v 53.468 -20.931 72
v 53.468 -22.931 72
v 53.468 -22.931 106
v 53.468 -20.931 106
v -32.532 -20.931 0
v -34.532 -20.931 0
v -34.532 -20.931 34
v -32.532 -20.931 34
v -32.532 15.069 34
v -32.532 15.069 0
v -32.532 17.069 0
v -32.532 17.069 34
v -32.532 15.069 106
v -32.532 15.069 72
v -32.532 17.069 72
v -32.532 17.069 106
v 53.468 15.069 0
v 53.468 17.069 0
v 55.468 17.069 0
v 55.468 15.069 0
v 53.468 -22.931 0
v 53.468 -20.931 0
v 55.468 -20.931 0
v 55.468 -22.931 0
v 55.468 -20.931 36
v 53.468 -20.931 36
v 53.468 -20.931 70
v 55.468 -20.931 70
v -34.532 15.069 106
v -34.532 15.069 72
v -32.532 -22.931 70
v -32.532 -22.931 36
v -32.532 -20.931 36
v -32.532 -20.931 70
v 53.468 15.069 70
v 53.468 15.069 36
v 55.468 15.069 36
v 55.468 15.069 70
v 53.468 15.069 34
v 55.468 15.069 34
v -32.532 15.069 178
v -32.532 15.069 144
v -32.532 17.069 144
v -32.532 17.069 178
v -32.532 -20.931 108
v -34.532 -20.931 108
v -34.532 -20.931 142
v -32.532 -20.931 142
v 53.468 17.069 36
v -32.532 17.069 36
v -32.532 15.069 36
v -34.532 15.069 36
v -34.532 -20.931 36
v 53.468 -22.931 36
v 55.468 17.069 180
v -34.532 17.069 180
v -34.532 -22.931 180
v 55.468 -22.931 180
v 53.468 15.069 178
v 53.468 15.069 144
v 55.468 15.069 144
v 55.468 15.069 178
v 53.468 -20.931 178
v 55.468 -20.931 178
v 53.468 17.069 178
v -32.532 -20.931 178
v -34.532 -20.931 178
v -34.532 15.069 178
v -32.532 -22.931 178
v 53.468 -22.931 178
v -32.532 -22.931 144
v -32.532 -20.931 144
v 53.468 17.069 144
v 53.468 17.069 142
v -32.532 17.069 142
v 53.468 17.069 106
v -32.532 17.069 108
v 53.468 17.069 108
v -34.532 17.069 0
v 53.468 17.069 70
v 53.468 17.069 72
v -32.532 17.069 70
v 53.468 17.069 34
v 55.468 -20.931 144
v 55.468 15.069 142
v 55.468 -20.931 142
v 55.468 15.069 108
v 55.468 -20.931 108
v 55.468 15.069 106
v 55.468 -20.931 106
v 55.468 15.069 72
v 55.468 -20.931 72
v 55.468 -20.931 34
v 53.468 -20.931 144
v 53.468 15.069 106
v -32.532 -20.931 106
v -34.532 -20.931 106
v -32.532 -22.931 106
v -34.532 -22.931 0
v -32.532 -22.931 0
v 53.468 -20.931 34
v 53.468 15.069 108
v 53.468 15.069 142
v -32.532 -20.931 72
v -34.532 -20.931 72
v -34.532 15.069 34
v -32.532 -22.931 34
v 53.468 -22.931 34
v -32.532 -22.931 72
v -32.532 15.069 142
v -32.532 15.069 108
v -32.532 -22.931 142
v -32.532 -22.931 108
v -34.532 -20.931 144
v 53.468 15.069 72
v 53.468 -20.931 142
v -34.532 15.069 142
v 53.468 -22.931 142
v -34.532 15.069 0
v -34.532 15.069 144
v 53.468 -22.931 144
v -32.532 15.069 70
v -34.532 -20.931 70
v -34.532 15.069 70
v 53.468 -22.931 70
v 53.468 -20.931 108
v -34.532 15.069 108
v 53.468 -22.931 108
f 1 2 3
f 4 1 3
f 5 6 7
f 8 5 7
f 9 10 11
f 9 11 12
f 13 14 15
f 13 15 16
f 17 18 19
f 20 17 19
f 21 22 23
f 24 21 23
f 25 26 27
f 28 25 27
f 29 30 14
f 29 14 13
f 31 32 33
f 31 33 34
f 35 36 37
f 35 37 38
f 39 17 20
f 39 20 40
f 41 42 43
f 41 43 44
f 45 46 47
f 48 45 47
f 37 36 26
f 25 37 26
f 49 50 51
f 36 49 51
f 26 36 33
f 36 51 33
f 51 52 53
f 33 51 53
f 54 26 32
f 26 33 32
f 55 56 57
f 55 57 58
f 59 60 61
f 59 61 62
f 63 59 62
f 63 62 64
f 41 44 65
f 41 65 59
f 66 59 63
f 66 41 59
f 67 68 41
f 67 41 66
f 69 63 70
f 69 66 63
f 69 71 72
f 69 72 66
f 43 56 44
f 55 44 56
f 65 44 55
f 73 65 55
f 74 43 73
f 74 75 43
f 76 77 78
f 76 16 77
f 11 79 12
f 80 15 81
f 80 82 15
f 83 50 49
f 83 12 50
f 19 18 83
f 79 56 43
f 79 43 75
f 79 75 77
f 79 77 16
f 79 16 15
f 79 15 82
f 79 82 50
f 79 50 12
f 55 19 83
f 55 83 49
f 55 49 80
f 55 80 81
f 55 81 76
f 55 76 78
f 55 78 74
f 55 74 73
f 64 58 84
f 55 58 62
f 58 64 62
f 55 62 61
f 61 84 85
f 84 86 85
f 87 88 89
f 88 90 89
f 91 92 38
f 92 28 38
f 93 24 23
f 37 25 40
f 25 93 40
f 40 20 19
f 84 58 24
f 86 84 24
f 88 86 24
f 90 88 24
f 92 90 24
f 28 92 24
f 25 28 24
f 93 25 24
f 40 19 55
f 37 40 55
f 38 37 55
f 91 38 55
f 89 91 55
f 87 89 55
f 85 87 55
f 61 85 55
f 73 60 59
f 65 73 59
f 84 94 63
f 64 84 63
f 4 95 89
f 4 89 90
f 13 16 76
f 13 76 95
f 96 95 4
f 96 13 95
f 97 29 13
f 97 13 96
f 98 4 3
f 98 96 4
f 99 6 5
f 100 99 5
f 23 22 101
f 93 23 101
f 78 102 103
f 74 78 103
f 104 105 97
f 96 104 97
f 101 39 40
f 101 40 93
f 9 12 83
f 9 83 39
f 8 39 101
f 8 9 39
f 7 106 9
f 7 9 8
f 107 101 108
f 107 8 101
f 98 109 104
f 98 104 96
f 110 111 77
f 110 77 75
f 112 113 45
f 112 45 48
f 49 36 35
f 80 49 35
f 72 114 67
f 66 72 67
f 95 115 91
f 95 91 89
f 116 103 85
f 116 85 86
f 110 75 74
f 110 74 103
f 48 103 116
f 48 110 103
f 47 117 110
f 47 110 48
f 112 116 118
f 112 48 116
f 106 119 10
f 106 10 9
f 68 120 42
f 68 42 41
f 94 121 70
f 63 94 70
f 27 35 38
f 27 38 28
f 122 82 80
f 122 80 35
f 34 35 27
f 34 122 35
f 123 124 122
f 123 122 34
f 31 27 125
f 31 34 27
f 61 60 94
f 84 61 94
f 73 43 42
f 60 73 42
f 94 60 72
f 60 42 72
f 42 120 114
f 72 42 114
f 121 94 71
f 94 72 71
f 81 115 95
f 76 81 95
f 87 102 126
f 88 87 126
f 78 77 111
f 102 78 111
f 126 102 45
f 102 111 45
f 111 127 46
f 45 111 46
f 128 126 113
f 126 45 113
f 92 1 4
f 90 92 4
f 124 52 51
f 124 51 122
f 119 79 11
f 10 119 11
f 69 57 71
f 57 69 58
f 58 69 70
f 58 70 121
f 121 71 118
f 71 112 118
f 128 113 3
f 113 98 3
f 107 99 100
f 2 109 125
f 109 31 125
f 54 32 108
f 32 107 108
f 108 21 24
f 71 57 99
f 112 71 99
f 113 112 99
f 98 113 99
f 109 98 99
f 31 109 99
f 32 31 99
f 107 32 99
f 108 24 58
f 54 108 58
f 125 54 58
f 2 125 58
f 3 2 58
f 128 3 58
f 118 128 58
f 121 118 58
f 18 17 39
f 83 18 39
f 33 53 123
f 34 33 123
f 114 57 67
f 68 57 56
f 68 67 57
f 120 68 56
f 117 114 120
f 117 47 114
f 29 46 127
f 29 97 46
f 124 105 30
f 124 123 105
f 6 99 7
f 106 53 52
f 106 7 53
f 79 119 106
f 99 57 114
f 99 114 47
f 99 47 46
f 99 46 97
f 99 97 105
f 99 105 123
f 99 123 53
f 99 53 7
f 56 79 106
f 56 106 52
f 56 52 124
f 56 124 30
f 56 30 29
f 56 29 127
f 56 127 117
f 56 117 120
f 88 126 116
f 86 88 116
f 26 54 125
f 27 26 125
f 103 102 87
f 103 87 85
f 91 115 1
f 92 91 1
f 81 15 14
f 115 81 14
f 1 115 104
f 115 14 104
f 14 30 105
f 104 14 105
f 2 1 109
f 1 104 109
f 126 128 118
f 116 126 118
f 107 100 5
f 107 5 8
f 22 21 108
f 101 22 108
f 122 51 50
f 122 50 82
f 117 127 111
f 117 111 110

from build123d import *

# Parameters (mm, degrees)
F0_W     = 90
F0_H     = 40
F1_DEPTH = 180
F2_W     = 86
F2_H     = 34
F3_DEPTH = 40.001
F4_W     = 36
F4_H     = 34
F5_DEPTH = 90.001


with BuildPart() as f1:
    # F0 (on Top) → F1 (new body)
    with BuildSketch(Plane.XY):
        with Locations((10.468276, -2.930649)):
            Rectangle(F0_W, F0_H)
    extrude(amount=F1_DEPTH)

    # F2 (on face) → F3 (cut, through all)
    with BuildSketch(Plane.XZ.offset(22.930649)):
        with Locations((10.468276, 161)):
            Rectangle(F2_W, F2_H)
        with Locations((10.468276, 125)):
            Rectangle(F2_W, F2_H)
        with Locations((10.468276, 89)):
            Rectangle(F2_W, F2_H)
        with Locations((10.468276, 53)):
            Rectangle(F2_W, F2_H)
        with Locations((10.468276, 17)):
            Rectangle(F2_W, F2_H)
    extrude(amount=-F3_DEPTH, mode=Mode.SUBTRACT)

    # F4 (on face) → F5 (cut, through all)
    with BuildSketch(Plane(origin=(-34.531724, 0, 0), x_dir=(0, -1, 0), z_dir=(-1, 0, 0))):
        with Locations((2.930649, 161)):
            Rectangle(F4_W, F4_H)
        with Locations((2.930649, 125)):
            Rectangle(F4_W, F4_H)
        with Locations((2.930649, 89)):
            Rectangle(F4_W, F4_H)
        with Locations((2.930649, 53)):
            Rectangle(F4_W, F4_H)
        with Locations((2.930649, 17)):
            Rectangle(F4_W, F4_H)
    extrude(amount=-F5_DEPTH, mode=Mode.SUBTRACT)


solid = f1.part
